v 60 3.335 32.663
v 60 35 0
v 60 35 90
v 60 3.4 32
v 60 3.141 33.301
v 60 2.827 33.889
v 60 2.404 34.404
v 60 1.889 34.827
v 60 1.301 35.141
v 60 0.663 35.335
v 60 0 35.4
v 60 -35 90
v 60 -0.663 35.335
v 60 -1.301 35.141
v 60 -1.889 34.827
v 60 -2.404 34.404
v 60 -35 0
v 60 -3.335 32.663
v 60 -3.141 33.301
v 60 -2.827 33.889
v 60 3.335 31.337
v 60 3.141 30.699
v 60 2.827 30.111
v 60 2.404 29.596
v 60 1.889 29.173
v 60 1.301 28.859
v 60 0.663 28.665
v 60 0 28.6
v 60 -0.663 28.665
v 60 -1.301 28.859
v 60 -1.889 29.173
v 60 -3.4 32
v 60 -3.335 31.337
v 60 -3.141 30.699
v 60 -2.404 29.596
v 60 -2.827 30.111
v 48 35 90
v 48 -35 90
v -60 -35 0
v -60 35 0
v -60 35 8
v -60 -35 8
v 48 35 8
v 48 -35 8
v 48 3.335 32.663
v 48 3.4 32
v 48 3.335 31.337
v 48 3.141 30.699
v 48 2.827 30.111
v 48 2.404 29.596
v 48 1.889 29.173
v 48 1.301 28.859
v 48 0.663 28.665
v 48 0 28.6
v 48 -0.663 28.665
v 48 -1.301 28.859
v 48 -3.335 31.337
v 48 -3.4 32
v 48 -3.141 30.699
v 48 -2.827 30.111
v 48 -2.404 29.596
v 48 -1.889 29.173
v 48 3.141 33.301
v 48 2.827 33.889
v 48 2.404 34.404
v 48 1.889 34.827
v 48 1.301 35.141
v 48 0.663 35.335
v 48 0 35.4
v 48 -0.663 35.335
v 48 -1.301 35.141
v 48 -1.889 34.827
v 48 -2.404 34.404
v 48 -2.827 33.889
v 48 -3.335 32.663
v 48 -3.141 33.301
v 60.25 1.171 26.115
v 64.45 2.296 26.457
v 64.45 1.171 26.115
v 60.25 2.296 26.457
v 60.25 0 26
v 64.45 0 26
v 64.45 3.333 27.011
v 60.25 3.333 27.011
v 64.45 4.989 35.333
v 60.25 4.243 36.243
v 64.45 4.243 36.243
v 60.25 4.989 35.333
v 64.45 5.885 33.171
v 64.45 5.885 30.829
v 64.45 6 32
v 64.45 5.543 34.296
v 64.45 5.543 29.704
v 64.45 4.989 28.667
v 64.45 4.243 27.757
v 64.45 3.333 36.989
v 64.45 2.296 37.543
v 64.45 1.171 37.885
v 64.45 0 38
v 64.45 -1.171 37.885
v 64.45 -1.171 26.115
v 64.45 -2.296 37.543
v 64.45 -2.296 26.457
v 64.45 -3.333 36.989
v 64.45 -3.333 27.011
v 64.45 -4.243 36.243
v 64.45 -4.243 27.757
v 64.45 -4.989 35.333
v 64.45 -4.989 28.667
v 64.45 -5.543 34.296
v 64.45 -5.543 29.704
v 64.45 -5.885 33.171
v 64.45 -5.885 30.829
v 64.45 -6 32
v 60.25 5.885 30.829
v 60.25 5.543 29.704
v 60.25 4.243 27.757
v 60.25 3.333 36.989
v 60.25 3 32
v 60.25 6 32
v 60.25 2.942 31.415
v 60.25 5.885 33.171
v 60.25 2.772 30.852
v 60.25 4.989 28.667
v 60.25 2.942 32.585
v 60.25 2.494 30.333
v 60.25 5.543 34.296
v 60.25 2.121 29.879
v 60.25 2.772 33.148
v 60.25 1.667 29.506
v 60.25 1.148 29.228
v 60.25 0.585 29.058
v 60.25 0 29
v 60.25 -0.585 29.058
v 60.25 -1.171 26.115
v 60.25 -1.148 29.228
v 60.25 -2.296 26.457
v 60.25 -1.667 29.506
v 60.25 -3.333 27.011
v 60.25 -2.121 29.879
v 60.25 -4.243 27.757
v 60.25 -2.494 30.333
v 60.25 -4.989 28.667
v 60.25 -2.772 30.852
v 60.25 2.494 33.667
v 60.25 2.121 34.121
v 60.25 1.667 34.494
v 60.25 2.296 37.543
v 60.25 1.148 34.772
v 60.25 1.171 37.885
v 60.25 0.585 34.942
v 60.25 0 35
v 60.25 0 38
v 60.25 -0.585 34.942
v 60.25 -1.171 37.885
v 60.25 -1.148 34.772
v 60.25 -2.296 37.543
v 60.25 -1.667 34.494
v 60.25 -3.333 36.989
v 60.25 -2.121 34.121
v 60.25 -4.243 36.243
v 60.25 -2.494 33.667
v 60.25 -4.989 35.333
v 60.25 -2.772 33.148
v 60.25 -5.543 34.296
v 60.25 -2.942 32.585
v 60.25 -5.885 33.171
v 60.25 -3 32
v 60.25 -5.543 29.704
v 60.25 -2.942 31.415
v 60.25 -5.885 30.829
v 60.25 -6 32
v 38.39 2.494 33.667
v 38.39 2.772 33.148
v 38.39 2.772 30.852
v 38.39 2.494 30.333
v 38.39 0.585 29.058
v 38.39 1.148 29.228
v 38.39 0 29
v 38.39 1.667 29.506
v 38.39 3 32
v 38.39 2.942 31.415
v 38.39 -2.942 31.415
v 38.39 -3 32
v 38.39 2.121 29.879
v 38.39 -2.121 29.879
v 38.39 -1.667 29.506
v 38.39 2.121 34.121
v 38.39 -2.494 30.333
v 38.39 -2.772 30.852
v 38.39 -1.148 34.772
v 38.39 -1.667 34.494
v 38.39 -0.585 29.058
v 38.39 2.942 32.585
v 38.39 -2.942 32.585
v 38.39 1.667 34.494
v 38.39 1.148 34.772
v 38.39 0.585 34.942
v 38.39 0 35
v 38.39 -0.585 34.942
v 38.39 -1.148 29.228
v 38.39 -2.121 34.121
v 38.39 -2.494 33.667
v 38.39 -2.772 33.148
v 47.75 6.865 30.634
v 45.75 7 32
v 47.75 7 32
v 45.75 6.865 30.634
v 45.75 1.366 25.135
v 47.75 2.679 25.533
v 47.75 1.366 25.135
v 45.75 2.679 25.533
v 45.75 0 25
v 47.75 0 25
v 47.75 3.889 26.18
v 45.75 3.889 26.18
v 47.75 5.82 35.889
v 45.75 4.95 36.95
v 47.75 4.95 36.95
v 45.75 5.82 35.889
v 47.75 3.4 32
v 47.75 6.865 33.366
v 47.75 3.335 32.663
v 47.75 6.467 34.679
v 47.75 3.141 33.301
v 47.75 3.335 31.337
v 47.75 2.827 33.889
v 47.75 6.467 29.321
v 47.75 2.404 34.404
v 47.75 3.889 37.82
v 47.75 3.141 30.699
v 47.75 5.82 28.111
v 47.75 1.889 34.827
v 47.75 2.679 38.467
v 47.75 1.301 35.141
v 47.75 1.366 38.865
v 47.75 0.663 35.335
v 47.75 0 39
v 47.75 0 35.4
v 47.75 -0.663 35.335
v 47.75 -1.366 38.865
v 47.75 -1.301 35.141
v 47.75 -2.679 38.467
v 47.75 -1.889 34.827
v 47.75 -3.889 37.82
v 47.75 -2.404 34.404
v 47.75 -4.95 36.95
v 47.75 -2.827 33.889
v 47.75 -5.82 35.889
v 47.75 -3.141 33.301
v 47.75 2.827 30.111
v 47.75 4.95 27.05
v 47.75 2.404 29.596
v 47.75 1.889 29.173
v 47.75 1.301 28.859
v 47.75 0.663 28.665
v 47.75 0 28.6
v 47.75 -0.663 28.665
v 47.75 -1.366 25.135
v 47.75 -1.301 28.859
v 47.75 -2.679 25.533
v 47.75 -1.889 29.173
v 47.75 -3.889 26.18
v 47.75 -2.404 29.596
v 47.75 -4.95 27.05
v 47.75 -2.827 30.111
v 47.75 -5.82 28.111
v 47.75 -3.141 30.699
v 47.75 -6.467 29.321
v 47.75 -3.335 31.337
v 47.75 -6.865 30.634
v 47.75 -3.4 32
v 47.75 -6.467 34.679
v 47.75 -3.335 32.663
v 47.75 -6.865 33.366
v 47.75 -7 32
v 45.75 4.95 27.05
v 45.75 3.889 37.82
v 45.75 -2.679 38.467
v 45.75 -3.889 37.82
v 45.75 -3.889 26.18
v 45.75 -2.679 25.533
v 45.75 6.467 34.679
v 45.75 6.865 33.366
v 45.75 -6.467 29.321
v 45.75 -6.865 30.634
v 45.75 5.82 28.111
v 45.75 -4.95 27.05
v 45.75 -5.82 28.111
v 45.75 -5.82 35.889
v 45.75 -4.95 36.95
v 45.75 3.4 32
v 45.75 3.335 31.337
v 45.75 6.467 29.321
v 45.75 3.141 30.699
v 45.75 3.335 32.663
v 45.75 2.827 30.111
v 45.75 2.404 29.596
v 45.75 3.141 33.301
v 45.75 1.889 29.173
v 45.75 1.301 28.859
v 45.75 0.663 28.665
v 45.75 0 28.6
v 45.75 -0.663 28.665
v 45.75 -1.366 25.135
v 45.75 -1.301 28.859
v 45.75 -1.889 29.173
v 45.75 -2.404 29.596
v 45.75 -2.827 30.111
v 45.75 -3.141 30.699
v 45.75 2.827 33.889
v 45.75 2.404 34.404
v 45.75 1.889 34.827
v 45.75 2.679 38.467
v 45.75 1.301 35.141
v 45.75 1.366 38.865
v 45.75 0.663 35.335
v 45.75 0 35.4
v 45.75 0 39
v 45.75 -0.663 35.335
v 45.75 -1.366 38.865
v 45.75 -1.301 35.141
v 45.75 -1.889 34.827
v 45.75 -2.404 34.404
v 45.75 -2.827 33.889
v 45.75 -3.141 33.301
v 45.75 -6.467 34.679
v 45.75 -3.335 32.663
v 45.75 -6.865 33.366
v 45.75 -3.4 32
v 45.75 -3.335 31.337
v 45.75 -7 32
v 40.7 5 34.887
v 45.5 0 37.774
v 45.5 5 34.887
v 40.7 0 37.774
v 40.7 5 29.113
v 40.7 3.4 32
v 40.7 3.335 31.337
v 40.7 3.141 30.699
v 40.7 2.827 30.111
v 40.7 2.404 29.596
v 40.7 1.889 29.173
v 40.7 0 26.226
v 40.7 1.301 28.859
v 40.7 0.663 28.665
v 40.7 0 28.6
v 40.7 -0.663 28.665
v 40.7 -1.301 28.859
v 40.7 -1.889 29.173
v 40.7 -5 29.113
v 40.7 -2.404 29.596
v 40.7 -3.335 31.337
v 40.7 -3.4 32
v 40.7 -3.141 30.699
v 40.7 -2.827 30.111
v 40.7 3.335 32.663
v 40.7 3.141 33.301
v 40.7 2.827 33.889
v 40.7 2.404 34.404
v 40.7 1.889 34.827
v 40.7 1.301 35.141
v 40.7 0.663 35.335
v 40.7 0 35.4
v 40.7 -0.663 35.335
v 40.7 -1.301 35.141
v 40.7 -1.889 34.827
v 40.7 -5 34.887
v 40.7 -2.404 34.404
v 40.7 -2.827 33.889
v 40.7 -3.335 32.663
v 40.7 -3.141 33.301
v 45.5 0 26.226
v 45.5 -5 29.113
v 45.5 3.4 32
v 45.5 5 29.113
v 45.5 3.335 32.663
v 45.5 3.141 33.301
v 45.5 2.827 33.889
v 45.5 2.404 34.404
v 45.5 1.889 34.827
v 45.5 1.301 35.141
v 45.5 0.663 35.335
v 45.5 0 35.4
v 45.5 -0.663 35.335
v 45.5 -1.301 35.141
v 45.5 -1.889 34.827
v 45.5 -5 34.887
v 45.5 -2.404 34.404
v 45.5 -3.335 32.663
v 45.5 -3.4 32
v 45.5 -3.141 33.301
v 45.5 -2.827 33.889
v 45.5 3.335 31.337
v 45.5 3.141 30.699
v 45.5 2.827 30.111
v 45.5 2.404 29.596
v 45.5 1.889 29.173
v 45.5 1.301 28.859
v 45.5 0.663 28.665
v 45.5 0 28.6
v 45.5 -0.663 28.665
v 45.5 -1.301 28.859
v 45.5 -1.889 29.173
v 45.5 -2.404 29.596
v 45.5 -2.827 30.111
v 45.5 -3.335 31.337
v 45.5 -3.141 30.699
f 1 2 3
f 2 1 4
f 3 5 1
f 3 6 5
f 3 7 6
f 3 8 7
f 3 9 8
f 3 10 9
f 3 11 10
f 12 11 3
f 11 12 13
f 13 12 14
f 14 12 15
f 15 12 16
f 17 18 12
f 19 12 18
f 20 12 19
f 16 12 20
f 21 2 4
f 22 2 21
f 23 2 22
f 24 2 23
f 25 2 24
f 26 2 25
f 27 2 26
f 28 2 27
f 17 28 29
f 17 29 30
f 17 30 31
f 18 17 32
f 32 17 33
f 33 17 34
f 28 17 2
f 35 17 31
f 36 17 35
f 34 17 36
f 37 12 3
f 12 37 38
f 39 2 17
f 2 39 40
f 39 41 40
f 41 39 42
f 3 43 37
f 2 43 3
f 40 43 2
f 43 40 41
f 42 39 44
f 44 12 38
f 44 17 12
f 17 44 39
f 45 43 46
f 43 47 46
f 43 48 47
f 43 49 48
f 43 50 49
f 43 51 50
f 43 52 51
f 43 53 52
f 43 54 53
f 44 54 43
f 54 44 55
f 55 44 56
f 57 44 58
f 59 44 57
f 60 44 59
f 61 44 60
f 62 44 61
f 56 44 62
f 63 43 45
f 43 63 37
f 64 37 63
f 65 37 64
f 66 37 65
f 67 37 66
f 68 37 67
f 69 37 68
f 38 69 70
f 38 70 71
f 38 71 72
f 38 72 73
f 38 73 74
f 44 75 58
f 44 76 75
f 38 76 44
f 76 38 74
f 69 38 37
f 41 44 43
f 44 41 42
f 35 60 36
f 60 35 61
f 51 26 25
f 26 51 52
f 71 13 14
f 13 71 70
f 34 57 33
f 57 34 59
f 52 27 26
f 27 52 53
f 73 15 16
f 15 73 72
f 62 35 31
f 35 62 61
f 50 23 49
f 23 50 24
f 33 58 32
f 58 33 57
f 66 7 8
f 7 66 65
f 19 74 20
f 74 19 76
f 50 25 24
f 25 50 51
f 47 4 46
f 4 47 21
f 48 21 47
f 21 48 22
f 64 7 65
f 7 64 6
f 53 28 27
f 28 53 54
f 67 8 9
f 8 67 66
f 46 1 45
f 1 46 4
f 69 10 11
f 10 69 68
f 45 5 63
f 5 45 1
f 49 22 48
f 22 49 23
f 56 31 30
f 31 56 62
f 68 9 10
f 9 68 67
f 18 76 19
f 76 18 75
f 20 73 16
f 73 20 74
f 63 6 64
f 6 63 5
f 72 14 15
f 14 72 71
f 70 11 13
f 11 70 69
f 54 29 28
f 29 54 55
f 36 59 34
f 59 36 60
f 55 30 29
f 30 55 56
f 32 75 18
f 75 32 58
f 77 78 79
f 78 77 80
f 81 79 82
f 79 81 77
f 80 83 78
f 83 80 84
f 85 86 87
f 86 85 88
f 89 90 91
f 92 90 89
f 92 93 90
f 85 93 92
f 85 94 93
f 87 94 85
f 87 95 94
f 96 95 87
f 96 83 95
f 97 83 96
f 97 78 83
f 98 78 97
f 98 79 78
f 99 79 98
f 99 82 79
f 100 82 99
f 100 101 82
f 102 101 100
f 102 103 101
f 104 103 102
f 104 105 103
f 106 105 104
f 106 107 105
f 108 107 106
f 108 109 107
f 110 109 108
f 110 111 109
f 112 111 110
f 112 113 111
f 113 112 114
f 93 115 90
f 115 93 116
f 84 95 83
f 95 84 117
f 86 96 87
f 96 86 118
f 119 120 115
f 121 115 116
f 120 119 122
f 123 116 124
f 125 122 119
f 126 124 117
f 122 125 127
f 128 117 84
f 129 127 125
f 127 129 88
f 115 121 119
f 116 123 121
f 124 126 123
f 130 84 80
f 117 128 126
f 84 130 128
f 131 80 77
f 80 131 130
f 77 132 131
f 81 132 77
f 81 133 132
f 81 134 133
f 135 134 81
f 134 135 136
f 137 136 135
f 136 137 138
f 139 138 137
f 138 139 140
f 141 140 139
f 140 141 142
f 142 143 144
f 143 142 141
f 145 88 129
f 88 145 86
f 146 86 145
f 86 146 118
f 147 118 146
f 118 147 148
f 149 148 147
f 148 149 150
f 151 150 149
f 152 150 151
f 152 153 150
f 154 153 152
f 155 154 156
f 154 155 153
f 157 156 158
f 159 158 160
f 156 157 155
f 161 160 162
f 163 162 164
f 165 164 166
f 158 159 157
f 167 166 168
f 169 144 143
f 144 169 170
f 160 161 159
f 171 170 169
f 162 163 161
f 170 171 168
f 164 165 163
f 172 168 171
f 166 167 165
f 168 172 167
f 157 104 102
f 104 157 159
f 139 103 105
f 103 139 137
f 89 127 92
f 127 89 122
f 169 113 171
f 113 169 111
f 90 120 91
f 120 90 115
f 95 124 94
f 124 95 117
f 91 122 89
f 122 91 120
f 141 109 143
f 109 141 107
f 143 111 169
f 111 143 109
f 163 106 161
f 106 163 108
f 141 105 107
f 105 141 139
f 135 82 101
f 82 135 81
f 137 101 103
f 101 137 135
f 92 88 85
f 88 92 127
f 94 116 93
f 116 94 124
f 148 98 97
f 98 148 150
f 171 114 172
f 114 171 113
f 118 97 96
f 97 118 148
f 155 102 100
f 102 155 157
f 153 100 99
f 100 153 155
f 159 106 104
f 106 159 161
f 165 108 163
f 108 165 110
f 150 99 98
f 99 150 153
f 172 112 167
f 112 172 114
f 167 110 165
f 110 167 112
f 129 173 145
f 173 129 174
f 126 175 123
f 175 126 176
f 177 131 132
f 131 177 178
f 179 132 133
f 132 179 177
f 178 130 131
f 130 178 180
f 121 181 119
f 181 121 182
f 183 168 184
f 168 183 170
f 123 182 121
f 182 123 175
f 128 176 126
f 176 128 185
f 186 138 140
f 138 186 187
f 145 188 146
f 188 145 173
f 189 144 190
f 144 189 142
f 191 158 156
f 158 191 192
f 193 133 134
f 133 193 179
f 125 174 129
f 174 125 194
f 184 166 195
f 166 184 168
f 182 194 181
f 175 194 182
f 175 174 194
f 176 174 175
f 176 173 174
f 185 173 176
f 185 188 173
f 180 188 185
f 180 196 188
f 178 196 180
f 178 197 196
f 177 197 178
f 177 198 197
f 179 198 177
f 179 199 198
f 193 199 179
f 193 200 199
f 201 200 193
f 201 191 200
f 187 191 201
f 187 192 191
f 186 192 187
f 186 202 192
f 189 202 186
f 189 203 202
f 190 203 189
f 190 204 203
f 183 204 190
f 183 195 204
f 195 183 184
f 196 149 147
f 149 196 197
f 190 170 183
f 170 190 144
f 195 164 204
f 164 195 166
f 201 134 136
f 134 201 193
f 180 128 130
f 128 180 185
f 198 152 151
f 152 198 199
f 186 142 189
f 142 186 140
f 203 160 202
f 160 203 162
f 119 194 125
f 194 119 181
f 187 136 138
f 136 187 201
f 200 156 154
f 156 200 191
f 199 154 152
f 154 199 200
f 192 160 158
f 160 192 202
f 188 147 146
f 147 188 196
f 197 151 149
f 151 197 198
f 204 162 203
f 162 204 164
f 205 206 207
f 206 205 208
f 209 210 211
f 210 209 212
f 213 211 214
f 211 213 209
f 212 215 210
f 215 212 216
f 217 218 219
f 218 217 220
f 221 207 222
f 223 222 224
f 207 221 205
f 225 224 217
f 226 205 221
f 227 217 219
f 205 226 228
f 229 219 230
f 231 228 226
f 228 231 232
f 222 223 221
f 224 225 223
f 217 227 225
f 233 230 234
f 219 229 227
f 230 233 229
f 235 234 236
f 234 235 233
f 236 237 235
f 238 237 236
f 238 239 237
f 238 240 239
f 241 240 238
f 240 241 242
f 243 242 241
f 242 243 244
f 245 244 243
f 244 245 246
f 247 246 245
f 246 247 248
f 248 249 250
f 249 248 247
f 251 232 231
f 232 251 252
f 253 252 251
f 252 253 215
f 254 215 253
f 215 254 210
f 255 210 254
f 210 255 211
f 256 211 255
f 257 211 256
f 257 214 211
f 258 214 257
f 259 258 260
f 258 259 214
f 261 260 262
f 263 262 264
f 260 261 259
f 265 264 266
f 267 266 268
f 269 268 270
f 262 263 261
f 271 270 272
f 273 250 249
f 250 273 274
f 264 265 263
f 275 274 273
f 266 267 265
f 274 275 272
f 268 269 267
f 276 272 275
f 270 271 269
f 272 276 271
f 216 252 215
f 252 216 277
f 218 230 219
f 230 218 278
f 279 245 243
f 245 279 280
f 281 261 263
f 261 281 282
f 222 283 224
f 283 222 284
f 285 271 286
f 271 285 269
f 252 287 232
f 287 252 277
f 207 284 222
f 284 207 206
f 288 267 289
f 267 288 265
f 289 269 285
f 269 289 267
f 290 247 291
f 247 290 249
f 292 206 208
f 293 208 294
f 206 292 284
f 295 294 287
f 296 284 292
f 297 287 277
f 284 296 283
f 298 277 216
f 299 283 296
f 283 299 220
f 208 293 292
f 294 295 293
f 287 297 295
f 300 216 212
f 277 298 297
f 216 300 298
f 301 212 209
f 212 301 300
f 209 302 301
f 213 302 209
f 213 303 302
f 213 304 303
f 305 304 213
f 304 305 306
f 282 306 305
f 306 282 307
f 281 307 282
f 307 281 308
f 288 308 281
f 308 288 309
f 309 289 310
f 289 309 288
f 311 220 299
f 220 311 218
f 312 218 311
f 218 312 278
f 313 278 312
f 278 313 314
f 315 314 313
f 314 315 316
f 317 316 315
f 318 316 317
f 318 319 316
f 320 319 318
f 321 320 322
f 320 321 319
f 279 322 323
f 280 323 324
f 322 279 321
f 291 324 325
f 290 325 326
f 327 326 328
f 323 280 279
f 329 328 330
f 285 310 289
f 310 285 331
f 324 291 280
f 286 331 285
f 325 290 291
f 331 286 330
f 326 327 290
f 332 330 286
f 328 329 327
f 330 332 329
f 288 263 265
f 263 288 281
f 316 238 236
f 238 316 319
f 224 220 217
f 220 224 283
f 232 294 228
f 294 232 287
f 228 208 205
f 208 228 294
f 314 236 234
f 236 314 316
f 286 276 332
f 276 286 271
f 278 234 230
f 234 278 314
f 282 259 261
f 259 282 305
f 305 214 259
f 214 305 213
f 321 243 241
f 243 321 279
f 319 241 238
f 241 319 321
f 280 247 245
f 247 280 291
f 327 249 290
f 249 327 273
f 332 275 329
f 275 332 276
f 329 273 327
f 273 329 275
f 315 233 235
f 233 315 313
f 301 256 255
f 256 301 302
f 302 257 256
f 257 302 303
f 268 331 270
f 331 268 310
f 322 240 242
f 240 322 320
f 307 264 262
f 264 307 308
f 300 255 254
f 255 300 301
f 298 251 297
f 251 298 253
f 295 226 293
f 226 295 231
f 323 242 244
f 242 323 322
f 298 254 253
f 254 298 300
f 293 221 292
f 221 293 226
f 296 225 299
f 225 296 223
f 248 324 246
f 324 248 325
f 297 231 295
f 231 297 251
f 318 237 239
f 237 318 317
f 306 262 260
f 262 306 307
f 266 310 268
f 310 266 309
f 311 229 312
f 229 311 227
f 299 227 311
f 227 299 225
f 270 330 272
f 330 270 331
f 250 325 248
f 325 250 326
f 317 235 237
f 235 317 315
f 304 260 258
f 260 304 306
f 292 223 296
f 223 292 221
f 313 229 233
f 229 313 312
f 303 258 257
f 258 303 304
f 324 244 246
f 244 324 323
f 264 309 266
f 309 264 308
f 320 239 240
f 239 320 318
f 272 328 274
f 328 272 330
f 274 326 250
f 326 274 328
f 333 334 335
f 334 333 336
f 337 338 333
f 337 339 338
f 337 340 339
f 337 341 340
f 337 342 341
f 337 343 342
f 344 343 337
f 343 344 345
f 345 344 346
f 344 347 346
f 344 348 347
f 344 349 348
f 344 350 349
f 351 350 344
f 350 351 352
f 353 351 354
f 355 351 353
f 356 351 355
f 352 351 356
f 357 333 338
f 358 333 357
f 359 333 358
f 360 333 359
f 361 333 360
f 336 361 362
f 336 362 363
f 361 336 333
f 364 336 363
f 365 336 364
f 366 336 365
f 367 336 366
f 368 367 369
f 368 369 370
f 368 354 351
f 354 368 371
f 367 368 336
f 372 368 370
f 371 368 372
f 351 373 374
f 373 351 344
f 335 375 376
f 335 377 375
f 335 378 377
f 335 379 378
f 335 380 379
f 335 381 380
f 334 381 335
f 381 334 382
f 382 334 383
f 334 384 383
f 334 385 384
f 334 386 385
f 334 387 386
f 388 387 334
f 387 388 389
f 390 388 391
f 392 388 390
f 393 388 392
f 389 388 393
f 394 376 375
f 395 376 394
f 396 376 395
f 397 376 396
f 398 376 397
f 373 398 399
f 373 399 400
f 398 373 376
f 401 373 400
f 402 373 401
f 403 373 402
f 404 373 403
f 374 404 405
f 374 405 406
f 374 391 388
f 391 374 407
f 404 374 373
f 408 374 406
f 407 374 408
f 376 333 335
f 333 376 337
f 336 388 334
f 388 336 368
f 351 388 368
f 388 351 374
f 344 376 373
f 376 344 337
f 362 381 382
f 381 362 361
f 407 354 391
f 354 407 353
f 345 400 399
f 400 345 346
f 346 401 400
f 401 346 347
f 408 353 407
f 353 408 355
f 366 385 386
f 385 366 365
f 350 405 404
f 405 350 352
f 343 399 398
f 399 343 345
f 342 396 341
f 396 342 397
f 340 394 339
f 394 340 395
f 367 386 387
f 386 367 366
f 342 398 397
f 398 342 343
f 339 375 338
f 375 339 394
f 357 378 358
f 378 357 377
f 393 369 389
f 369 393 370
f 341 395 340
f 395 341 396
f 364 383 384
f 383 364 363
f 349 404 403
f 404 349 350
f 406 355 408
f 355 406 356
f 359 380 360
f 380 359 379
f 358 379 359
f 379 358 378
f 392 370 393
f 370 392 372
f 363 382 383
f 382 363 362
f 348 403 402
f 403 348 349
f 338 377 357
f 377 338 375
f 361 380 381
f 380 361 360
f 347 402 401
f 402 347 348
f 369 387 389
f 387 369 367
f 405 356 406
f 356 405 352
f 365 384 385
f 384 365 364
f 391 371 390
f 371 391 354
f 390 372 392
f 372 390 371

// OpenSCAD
$fn = 32;

// ------------------------------------------------------------------------
// Bolted bracket: 120 x 70 mm bracket with 1 bolt joints
// Every part is its own module, assembly() places them once.
// ------------------------------------------------------------------------

// --- part 1 ---
module bracket() {
  difference() {
    translate([-60, -35, 0]) cube([120, 70, 90]);
    translate([-61, -36, 8]) cube([109, 72, 83]);
    translate([54, 0, 32]) rotate([0, 90, 0]) cylinder(h = 14, d = 6.8, center = true);
  }
}

// --- part 2 ---
module bolt() {
  cylinder(h = 4.2, d = 12);
  translate([0, 0, -21.86]) cylinder(h = 21.86, d = 6);
}

// --- part 3 ---
module washer() {
  difference() {
      translate([0, 0, 0]) cylinder(h = 2, d = 14);
      translate([0, 0, -1]) cylinder(h = 4, d = 6.8);
    }
}

// --- part 4 ---
module nut() {
  difference() {
    linear_extrude(height = 4.8) polygon(points = [[5.774, 0], [2.887, 5], [-2.887, 5], [-5.774, 0], [-2.887, -5], [2.887, -5]]);
    translate([0, 0, -1]) cylinder(h = 6.8, d = 6.8);
  }
}

// --- assembly ---
module assembly() {
  translate([0, 0, 0]) rotate([0, 0, 0]) bracket();
  translate([60.25, 0, 32]) rotate([0, 90, 0]) bolt();
  translate([45.75, 0, 32]) rotate([0, 90, 0]) washer();
  translate([40.7, 0, 32]) rotate([0, 90, 0]) nut();
}

assembly();
